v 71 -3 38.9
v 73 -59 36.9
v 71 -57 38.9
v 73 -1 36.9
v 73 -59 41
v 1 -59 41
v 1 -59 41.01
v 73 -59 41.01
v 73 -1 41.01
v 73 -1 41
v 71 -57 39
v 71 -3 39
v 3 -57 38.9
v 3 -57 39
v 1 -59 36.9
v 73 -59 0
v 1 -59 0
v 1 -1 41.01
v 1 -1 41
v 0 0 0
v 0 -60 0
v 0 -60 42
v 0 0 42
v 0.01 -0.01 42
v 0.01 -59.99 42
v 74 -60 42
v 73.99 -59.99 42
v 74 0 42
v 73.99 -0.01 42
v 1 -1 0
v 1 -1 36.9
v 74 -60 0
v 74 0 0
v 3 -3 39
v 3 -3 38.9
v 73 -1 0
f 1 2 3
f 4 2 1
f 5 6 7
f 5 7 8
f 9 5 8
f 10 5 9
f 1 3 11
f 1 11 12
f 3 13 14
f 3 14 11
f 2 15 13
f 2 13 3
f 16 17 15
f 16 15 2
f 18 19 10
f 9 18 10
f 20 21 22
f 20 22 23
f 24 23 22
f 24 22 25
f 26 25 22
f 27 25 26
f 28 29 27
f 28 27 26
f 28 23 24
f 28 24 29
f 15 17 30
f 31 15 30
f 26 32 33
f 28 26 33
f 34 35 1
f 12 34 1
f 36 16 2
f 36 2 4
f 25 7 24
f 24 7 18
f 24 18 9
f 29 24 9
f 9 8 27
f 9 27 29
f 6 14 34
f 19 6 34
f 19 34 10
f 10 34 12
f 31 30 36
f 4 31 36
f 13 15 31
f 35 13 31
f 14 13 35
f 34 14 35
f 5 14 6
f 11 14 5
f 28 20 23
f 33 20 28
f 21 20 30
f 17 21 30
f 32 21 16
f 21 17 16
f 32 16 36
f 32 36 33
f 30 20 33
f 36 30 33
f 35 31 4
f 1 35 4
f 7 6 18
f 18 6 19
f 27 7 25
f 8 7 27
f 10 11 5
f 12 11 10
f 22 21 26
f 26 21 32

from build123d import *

# Parameters (mm, degrees)
BOX039_W        = 68
BOX039_H        = 54
BOX039_DEPTH    = 4.1
BOX038_W        = 74
BOX038_H        = 60
BOX038_DEPTH    = 4.1
CHAMFER021_SIZE = 2
CHAMFER022_SIZE = 2
BOX033_W        = 72
BOX033_H        = 58
BOX033_DEPTH    = 42
BOX032_W        = 74
BOX032_H        = 60
BOX032_DEPTH    = 42
CHAMFER020_SIZE = 0.99


with BuildPart() as kragen_stecker_ausschnitt:
    # Box039 → Box039 (new body)
    with BuildSketch(Plane(origin=(3, -57, 0), x_dir=(1, 0, 0), z_dir=(0, 0, 1))):
        with Locations((34, 27)):
            Rectangle(BOX039_W, BOX039_H)
    extrude(amount=BOX039_DEPTH)


with BuildPart() as chamfer022:
    # Box038 → Box038 (new body)
    with BuildSketch(Plane(origin=(0, -60, 0), x_dir=(1, 0, 0), z_dir=(0, 0, 1))):
        with Locations((37, 30)):
            Rectangle(BOX038_W, BOX038_H)
    extrude(amount=BOX038_DEPTH)

    # Cut019: cut Kragen Stecker Ausschnitt
    add(kragen_stecker_ausschnitt.part, mode=Mode.SUBTRACT)


with BuildPart() as chamfer022_1:
    # Cut019 placement: moved
    add(chamfer022.part.moved(Location((0, 0, 36.9))))

    # Chamfer021
    chamfer021_edges = [chamfer022_1.edges().sort_by_distance(p)[0] for p in [
        (37, -3, 41),
        (3, -30, 41),
        (37, -57, 41),
        (71, -30, 41),
    ]]
    chamfer(chamfer021_edges, length=CHAMFER021_SIZE)

    # Chamfer022
    chamfer022_edges = [chamfer022_1.edges().sort_by_distance(p)[0] for p in [
        (37, -3, 36.9),
        (3, -30, 36.9),
        (71, -30, 36.9),
        (37, -57, 36.9),
    ]]
    chamfer(chamfer022_edges, length=CHAMFER022_SIZE)


with BuildPart() as ausschnitt_stecker:
    # Box033 → Box033 (new body)
    with BuildSketch(Plane(origin=(1, -59, 0), x_dir=(1, 0, 0), z_dir=(0, 0, 1))):
        with Locations((36, 29)):
            Rectangle(BOX033_W, BOX033_H)
    extrude(amount=BOX033_DEPTH)


with BuildPart() as form:
    # Box032 → Box032 (new body)
    with BuildSketch(Plane(origin=(0, -60, 0), x_dir=(1, 0, 0), z_dir=(0, 0, 1))):
        with Locations((37, 30)):
            Rectangle(BOX032_W, BOX032_H)
    extrude(amount=BOX032_DEPTH)

    # Cut014: cut Ausschnitt Stecker
    add(ausschnitt_stecker.part, mode=Mode.SUBTRACT)

    # Chamfer020
    chamfer020_edges = [form.edges().sort_by_distance(p)[0] for p in [
        (37, -1, 42),
        (1, -30, 42),
        (37, -59, 42),
        (73, -30, 42),
    ]]
    chamfer(chamfer020_edges, length=CHAMFER020_SIZE)

    # Fusion: union Chamfer022
    add(chamfer022_1.part)


solid = form.part
